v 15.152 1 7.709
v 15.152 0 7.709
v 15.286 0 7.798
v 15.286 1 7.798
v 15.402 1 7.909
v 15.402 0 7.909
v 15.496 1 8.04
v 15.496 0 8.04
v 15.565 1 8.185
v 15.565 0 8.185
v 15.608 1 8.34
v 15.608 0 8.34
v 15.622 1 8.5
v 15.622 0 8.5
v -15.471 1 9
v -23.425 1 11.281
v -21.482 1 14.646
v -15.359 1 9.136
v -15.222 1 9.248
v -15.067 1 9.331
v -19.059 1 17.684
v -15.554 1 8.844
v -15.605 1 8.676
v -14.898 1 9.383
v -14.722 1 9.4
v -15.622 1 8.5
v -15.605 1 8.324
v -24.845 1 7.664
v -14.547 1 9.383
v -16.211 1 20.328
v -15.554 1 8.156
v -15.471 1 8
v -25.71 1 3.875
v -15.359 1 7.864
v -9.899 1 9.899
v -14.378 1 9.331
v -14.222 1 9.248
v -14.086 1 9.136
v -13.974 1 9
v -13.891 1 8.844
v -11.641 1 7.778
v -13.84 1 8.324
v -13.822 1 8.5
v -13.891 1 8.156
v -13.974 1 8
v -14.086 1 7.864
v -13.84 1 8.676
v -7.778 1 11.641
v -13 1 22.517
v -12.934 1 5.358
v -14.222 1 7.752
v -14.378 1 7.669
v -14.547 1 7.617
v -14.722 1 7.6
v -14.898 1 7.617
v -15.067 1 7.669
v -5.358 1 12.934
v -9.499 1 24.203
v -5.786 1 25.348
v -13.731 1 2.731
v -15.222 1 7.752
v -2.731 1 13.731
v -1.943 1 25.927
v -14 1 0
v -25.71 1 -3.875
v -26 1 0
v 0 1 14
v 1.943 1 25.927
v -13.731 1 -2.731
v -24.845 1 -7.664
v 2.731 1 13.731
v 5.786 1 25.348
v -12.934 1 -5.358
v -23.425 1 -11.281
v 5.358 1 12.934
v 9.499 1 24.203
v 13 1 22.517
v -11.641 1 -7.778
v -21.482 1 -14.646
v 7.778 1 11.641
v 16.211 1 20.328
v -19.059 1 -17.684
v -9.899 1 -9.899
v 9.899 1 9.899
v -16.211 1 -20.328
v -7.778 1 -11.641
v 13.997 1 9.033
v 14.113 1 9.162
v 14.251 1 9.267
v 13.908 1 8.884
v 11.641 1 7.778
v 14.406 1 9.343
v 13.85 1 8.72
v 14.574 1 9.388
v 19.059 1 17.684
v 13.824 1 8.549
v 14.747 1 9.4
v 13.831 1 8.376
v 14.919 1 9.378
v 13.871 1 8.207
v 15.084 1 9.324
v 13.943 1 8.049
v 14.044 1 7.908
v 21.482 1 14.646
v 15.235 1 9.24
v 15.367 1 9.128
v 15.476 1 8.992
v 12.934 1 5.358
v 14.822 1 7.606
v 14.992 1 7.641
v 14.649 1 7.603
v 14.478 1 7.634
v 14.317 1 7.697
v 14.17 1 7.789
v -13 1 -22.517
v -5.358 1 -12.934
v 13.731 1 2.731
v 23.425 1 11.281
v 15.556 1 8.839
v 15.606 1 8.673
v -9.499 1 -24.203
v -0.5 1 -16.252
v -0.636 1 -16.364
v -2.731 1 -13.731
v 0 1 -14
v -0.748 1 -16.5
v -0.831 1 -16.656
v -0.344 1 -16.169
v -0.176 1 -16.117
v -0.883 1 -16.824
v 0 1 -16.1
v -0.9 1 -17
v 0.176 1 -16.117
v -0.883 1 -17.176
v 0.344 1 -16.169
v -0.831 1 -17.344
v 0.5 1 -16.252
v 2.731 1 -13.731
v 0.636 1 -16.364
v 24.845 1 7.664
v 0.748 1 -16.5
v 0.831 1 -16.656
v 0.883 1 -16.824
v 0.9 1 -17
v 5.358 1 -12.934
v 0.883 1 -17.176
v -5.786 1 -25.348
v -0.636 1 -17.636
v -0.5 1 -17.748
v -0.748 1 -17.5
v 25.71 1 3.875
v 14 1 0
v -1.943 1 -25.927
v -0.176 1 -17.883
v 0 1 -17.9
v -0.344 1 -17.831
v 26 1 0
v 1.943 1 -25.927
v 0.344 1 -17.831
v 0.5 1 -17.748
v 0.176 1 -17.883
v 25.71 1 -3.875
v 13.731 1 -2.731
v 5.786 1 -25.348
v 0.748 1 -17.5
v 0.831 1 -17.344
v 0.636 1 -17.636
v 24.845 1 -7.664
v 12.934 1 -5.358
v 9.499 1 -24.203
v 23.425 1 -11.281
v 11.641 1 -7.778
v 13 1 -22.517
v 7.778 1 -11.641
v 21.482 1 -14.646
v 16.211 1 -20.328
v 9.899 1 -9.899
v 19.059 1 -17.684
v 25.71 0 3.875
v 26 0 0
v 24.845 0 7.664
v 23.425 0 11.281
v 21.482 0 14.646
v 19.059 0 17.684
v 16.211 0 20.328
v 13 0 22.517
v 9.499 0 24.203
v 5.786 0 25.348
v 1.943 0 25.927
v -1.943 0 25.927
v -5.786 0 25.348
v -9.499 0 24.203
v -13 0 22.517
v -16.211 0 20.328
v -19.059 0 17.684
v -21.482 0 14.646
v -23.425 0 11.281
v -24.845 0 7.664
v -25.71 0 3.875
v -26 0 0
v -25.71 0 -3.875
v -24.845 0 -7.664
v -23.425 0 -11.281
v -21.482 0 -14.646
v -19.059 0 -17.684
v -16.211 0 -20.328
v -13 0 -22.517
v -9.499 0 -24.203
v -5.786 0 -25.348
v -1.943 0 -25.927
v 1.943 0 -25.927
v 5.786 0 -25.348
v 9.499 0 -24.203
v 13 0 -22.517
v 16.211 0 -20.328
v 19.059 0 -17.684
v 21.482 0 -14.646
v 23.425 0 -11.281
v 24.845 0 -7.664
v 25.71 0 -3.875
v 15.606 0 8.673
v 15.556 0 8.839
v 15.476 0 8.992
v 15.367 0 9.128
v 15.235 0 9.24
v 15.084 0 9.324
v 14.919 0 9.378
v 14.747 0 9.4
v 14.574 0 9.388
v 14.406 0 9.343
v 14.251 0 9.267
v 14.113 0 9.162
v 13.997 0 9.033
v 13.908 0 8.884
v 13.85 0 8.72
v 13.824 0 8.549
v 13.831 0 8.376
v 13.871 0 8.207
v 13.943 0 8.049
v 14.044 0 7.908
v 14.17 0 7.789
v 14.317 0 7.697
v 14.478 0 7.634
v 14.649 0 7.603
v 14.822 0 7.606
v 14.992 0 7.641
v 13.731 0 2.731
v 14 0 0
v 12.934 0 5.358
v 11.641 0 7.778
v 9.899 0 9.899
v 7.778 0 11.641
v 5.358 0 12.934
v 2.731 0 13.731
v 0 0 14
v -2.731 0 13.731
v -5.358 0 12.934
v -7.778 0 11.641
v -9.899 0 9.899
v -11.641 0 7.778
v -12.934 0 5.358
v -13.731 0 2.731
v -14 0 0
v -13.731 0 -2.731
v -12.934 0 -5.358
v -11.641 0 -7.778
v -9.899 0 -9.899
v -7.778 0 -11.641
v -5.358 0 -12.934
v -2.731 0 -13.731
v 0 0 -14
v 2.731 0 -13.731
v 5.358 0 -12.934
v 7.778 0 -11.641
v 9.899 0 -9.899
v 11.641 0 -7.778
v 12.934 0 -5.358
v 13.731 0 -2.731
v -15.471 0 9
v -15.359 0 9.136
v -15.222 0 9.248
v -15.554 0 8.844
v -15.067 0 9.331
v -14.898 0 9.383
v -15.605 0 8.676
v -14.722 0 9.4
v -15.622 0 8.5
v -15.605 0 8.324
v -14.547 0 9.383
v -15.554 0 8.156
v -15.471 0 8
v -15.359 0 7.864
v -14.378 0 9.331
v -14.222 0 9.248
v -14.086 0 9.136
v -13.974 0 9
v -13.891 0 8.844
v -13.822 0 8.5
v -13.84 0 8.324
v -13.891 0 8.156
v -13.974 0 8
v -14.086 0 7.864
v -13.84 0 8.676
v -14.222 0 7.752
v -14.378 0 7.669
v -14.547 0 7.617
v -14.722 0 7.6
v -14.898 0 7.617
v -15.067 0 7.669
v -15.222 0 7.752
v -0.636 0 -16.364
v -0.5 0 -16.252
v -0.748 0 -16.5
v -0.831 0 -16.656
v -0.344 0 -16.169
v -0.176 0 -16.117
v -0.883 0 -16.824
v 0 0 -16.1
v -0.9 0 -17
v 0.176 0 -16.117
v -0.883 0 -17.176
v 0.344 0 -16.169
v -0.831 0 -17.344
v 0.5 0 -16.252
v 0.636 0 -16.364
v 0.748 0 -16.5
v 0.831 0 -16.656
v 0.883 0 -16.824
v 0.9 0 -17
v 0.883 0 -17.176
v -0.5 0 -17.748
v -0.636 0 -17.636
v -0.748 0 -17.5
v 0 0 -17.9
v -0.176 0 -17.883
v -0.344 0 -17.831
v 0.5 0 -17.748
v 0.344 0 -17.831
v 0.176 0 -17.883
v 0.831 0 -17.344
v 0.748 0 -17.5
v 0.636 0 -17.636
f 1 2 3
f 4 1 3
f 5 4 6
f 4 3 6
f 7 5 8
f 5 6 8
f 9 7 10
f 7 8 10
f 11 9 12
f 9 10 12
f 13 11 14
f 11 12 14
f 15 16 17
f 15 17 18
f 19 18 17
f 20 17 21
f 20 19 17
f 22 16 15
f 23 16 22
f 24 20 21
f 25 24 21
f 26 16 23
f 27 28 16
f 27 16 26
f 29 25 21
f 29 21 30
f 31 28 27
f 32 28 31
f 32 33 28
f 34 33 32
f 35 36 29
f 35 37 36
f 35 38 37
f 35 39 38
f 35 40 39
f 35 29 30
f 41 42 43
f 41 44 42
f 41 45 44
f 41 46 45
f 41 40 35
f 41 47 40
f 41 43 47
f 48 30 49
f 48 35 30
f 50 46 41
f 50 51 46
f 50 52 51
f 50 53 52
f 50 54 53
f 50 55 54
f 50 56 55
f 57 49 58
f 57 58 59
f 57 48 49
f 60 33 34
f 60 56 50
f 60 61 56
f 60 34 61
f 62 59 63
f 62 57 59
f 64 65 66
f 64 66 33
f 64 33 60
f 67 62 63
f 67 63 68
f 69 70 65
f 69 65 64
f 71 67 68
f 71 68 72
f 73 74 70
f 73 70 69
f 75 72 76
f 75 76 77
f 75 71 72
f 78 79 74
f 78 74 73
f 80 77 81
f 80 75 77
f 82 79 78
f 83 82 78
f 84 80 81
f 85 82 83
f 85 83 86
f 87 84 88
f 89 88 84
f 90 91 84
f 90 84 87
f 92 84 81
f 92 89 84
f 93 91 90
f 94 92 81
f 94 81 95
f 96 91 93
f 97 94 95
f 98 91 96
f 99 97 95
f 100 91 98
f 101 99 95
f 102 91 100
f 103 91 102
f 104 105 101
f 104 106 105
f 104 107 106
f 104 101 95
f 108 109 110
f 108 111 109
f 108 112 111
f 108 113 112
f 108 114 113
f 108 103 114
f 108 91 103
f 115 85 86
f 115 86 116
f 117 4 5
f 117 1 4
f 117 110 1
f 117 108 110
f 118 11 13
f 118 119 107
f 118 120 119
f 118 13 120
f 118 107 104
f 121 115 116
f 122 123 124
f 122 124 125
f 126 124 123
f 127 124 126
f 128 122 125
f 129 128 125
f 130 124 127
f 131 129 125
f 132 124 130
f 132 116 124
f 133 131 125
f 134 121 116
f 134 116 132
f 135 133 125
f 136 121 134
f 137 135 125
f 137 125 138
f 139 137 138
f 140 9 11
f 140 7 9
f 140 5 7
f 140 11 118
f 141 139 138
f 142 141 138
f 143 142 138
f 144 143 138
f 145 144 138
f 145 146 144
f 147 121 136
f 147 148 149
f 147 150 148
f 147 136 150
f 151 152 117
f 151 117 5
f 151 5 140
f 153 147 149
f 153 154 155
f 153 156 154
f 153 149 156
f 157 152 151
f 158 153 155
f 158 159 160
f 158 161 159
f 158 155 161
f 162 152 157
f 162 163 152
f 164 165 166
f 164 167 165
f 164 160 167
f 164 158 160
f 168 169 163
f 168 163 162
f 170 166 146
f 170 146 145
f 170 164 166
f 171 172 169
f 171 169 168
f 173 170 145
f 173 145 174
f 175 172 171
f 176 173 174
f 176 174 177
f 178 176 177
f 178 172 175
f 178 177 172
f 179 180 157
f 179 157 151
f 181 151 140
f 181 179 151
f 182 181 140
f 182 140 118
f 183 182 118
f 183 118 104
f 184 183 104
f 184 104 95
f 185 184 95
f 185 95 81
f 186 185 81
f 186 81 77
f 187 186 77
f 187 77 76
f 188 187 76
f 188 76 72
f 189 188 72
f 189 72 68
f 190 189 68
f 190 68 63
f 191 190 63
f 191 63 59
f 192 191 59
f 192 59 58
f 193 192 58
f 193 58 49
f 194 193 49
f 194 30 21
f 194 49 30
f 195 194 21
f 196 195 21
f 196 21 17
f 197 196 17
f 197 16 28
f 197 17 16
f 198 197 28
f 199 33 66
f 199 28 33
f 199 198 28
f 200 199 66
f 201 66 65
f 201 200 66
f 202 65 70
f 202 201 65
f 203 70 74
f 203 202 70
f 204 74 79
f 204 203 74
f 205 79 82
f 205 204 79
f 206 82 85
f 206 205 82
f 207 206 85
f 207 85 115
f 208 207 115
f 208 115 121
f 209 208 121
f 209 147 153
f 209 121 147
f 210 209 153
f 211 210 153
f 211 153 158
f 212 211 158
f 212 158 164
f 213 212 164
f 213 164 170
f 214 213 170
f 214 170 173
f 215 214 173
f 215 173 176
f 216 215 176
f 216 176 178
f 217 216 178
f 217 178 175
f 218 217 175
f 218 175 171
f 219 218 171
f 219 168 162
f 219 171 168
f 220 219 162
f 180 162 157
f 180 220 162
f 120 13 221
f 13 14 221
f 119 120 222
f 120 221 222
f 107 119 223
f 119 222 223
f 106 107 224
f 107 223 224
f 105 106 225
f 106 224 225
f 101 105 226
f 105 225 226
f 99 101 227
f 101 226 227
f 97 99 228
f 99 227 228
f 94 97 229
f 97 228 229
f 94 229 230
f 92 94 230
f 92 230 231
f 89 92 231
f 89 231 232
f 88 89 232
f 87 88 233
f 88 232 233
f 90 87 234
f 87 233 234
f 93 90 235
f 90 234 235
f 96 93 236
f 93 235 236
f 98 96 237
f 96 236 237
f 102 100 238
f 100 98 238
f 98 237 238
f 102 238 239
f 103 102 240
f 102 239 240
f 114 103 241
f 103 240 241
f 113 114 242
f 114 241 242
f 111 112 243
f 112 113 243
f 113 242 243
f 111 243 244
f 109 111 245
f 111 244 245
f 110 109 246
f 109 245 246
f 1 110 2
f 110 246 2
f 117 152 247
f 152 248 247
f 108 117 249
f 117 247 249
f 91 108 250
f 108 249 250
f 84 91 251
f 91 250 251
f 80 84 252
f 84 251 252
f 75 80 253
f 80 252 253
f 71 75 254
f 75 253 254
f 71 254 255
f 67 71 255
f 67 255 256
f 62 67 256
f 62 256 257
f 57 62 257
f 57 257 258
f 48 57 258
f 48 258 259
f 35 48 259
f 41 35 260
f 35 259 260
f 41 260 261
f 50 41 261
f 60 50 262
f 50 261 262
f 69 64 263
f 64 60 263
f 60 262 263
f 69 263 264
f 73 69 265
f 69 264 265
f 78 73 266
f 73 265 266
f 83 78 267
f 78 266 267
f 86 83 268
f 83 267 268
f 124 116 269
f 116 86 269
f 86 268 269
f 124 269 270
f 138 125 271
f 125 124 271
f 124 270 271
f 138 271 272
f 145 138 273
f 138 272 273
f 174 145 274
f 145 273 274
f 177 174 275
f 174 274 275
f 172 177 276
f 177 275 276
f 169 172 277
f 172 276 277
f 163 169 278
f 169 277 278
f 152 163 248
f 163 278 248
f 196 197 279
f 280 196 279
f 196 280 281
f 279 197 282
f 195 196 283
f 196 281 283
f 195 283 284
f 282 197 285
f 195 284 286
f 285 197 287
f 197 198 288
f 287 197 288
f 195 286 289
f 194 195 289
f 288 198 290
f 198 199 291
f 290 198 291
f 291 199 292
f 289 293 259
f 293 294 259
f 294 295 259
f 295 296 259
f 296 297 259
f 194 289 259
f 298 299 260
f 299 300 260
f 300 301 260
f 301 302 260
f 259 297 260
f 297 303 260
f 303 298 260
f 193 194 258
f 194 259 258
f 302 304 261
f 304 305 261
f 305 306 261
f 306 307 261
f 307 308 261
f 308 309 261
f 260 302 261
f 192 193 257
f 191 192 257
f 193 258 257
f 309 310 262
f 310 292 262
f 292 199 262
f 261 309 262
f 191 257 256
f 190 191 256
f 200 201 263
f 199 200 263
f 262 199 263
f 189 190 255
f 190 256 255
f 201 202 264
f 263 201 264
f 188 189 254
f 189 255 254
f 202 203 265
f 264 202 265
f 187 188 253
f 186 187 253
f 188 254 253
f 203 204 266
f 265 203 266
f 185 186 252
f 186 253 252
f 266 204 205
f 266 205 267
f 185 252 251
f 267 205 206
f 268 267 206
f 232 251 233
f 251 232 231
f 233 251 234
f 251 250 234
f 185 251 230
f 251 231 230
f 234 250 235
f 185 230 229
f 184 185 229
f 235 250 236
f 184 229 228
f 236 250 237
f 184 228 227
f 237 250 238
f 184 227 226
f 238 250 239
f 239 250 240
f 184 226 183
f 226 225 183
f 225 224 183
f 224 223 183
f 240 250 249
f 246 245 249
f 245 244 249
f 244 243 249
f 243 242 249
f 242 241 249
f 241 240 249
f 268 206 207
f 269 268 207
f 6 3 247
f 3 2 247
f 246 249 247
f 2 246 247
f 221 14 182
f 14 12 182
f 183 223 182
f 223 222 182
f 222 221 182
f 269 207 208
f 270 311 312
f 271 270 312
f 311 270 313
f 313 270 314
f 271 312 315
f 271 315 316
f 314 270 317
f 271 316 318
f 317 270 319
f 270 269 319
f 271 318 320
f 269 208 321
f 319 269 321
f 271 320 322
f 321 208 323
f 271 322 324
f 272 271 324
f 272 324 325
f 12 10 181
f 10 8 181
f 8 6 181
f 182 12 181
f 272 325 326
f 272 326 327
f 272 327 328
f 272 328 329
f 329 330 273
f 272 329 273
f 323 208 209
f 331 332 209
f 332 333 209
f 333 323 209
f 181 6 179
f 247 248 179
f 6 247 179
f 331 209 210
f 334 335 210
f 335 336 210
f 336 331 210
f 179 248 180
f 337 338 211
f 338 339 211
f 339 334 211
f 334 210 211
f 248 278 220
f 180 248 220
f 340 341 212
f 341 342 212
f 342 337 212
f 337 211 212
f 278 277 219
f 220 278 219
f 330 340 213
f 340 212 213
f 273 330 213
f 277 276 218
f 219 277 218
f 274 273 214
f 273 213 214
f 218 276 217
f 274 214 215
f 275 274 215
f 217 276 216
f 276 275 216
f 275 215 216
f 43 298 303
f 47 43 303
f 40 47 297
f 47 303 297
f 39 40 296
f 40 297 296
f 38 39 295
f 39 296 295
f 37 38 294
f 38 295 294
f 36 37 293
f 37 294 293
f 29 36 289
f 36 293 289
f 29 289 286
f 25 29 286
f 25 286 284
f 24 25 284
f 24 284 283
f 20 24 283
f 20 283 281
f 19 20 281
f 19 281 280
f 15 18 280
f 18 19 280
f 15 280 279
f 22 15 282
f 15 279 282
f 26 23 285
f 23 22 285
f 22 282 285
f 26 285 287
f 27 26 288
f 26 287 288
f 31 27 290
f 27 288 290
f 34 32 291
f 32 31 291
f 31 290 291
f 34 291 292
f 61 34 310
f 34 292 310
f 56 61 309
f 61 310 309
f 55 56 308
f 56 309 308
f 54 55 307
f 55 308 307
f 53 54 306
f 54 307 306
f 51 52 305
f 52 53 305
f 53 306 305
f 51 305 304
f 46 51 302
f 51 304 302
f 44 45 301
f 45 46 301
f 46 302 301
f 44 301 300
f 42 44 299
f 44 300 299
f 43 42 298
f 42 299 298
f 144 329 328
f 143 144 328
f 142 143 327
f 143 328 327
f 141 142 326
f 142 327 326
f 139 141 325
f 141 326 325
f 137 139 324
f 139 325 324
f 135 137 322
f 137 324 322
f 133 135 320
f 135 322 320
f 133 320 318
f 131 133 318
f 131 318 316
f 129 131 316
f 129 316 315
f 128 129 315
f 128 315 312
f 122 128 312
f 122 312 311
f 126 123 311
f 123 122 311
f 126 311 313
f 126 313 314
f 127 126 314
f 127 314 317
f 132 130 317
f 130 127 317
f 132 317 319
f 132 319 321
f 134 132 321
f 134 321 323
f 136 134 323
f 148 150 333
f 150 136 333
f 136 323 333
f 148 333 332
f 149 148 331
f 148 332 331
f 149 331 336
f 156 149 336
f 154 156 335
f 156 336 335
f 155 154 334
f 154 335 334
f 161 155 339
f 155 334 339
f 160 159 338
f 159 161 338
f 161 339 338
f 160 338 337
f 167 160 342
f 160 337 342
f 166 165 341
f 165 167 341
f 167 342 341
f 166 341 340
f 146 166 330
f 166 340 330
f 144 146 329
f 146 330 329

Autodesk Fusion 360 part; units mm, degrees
sketch "Sketch1" plane through (0, 0, 0) normal (0, 1, 0) x (1, 0, 0)
  circle A0 centre (0, 0) radius 14
  circle A1 centre (0, 0) radius 17 construction
  circle A2 centre (0, 0) radius 26
  arc A3 (14.7224, -8.5) -> (17, 0) centre (0, 0) ccw
  line L0 (0, 0) -> (14.7224, -8.5) construction
  line L1 (0, 0) -> (17, 0) construction
  circle A4 centre (14.7224, -8.5) radius 0.9
  circle A5 centre (0, 17) radius 0.9
  circle A6 centre (-14.7224, -8.5) radius 0.9
  dimension "d1" = 28
  dimension "d2" = 34
  dimension "d3" = 52
  dimension "d4" = 30
  dimension "d5" = 1.8
  dimension "d7" = 360
extrude "Extrude1" add sketch "Sketch1" along normal blind 1
